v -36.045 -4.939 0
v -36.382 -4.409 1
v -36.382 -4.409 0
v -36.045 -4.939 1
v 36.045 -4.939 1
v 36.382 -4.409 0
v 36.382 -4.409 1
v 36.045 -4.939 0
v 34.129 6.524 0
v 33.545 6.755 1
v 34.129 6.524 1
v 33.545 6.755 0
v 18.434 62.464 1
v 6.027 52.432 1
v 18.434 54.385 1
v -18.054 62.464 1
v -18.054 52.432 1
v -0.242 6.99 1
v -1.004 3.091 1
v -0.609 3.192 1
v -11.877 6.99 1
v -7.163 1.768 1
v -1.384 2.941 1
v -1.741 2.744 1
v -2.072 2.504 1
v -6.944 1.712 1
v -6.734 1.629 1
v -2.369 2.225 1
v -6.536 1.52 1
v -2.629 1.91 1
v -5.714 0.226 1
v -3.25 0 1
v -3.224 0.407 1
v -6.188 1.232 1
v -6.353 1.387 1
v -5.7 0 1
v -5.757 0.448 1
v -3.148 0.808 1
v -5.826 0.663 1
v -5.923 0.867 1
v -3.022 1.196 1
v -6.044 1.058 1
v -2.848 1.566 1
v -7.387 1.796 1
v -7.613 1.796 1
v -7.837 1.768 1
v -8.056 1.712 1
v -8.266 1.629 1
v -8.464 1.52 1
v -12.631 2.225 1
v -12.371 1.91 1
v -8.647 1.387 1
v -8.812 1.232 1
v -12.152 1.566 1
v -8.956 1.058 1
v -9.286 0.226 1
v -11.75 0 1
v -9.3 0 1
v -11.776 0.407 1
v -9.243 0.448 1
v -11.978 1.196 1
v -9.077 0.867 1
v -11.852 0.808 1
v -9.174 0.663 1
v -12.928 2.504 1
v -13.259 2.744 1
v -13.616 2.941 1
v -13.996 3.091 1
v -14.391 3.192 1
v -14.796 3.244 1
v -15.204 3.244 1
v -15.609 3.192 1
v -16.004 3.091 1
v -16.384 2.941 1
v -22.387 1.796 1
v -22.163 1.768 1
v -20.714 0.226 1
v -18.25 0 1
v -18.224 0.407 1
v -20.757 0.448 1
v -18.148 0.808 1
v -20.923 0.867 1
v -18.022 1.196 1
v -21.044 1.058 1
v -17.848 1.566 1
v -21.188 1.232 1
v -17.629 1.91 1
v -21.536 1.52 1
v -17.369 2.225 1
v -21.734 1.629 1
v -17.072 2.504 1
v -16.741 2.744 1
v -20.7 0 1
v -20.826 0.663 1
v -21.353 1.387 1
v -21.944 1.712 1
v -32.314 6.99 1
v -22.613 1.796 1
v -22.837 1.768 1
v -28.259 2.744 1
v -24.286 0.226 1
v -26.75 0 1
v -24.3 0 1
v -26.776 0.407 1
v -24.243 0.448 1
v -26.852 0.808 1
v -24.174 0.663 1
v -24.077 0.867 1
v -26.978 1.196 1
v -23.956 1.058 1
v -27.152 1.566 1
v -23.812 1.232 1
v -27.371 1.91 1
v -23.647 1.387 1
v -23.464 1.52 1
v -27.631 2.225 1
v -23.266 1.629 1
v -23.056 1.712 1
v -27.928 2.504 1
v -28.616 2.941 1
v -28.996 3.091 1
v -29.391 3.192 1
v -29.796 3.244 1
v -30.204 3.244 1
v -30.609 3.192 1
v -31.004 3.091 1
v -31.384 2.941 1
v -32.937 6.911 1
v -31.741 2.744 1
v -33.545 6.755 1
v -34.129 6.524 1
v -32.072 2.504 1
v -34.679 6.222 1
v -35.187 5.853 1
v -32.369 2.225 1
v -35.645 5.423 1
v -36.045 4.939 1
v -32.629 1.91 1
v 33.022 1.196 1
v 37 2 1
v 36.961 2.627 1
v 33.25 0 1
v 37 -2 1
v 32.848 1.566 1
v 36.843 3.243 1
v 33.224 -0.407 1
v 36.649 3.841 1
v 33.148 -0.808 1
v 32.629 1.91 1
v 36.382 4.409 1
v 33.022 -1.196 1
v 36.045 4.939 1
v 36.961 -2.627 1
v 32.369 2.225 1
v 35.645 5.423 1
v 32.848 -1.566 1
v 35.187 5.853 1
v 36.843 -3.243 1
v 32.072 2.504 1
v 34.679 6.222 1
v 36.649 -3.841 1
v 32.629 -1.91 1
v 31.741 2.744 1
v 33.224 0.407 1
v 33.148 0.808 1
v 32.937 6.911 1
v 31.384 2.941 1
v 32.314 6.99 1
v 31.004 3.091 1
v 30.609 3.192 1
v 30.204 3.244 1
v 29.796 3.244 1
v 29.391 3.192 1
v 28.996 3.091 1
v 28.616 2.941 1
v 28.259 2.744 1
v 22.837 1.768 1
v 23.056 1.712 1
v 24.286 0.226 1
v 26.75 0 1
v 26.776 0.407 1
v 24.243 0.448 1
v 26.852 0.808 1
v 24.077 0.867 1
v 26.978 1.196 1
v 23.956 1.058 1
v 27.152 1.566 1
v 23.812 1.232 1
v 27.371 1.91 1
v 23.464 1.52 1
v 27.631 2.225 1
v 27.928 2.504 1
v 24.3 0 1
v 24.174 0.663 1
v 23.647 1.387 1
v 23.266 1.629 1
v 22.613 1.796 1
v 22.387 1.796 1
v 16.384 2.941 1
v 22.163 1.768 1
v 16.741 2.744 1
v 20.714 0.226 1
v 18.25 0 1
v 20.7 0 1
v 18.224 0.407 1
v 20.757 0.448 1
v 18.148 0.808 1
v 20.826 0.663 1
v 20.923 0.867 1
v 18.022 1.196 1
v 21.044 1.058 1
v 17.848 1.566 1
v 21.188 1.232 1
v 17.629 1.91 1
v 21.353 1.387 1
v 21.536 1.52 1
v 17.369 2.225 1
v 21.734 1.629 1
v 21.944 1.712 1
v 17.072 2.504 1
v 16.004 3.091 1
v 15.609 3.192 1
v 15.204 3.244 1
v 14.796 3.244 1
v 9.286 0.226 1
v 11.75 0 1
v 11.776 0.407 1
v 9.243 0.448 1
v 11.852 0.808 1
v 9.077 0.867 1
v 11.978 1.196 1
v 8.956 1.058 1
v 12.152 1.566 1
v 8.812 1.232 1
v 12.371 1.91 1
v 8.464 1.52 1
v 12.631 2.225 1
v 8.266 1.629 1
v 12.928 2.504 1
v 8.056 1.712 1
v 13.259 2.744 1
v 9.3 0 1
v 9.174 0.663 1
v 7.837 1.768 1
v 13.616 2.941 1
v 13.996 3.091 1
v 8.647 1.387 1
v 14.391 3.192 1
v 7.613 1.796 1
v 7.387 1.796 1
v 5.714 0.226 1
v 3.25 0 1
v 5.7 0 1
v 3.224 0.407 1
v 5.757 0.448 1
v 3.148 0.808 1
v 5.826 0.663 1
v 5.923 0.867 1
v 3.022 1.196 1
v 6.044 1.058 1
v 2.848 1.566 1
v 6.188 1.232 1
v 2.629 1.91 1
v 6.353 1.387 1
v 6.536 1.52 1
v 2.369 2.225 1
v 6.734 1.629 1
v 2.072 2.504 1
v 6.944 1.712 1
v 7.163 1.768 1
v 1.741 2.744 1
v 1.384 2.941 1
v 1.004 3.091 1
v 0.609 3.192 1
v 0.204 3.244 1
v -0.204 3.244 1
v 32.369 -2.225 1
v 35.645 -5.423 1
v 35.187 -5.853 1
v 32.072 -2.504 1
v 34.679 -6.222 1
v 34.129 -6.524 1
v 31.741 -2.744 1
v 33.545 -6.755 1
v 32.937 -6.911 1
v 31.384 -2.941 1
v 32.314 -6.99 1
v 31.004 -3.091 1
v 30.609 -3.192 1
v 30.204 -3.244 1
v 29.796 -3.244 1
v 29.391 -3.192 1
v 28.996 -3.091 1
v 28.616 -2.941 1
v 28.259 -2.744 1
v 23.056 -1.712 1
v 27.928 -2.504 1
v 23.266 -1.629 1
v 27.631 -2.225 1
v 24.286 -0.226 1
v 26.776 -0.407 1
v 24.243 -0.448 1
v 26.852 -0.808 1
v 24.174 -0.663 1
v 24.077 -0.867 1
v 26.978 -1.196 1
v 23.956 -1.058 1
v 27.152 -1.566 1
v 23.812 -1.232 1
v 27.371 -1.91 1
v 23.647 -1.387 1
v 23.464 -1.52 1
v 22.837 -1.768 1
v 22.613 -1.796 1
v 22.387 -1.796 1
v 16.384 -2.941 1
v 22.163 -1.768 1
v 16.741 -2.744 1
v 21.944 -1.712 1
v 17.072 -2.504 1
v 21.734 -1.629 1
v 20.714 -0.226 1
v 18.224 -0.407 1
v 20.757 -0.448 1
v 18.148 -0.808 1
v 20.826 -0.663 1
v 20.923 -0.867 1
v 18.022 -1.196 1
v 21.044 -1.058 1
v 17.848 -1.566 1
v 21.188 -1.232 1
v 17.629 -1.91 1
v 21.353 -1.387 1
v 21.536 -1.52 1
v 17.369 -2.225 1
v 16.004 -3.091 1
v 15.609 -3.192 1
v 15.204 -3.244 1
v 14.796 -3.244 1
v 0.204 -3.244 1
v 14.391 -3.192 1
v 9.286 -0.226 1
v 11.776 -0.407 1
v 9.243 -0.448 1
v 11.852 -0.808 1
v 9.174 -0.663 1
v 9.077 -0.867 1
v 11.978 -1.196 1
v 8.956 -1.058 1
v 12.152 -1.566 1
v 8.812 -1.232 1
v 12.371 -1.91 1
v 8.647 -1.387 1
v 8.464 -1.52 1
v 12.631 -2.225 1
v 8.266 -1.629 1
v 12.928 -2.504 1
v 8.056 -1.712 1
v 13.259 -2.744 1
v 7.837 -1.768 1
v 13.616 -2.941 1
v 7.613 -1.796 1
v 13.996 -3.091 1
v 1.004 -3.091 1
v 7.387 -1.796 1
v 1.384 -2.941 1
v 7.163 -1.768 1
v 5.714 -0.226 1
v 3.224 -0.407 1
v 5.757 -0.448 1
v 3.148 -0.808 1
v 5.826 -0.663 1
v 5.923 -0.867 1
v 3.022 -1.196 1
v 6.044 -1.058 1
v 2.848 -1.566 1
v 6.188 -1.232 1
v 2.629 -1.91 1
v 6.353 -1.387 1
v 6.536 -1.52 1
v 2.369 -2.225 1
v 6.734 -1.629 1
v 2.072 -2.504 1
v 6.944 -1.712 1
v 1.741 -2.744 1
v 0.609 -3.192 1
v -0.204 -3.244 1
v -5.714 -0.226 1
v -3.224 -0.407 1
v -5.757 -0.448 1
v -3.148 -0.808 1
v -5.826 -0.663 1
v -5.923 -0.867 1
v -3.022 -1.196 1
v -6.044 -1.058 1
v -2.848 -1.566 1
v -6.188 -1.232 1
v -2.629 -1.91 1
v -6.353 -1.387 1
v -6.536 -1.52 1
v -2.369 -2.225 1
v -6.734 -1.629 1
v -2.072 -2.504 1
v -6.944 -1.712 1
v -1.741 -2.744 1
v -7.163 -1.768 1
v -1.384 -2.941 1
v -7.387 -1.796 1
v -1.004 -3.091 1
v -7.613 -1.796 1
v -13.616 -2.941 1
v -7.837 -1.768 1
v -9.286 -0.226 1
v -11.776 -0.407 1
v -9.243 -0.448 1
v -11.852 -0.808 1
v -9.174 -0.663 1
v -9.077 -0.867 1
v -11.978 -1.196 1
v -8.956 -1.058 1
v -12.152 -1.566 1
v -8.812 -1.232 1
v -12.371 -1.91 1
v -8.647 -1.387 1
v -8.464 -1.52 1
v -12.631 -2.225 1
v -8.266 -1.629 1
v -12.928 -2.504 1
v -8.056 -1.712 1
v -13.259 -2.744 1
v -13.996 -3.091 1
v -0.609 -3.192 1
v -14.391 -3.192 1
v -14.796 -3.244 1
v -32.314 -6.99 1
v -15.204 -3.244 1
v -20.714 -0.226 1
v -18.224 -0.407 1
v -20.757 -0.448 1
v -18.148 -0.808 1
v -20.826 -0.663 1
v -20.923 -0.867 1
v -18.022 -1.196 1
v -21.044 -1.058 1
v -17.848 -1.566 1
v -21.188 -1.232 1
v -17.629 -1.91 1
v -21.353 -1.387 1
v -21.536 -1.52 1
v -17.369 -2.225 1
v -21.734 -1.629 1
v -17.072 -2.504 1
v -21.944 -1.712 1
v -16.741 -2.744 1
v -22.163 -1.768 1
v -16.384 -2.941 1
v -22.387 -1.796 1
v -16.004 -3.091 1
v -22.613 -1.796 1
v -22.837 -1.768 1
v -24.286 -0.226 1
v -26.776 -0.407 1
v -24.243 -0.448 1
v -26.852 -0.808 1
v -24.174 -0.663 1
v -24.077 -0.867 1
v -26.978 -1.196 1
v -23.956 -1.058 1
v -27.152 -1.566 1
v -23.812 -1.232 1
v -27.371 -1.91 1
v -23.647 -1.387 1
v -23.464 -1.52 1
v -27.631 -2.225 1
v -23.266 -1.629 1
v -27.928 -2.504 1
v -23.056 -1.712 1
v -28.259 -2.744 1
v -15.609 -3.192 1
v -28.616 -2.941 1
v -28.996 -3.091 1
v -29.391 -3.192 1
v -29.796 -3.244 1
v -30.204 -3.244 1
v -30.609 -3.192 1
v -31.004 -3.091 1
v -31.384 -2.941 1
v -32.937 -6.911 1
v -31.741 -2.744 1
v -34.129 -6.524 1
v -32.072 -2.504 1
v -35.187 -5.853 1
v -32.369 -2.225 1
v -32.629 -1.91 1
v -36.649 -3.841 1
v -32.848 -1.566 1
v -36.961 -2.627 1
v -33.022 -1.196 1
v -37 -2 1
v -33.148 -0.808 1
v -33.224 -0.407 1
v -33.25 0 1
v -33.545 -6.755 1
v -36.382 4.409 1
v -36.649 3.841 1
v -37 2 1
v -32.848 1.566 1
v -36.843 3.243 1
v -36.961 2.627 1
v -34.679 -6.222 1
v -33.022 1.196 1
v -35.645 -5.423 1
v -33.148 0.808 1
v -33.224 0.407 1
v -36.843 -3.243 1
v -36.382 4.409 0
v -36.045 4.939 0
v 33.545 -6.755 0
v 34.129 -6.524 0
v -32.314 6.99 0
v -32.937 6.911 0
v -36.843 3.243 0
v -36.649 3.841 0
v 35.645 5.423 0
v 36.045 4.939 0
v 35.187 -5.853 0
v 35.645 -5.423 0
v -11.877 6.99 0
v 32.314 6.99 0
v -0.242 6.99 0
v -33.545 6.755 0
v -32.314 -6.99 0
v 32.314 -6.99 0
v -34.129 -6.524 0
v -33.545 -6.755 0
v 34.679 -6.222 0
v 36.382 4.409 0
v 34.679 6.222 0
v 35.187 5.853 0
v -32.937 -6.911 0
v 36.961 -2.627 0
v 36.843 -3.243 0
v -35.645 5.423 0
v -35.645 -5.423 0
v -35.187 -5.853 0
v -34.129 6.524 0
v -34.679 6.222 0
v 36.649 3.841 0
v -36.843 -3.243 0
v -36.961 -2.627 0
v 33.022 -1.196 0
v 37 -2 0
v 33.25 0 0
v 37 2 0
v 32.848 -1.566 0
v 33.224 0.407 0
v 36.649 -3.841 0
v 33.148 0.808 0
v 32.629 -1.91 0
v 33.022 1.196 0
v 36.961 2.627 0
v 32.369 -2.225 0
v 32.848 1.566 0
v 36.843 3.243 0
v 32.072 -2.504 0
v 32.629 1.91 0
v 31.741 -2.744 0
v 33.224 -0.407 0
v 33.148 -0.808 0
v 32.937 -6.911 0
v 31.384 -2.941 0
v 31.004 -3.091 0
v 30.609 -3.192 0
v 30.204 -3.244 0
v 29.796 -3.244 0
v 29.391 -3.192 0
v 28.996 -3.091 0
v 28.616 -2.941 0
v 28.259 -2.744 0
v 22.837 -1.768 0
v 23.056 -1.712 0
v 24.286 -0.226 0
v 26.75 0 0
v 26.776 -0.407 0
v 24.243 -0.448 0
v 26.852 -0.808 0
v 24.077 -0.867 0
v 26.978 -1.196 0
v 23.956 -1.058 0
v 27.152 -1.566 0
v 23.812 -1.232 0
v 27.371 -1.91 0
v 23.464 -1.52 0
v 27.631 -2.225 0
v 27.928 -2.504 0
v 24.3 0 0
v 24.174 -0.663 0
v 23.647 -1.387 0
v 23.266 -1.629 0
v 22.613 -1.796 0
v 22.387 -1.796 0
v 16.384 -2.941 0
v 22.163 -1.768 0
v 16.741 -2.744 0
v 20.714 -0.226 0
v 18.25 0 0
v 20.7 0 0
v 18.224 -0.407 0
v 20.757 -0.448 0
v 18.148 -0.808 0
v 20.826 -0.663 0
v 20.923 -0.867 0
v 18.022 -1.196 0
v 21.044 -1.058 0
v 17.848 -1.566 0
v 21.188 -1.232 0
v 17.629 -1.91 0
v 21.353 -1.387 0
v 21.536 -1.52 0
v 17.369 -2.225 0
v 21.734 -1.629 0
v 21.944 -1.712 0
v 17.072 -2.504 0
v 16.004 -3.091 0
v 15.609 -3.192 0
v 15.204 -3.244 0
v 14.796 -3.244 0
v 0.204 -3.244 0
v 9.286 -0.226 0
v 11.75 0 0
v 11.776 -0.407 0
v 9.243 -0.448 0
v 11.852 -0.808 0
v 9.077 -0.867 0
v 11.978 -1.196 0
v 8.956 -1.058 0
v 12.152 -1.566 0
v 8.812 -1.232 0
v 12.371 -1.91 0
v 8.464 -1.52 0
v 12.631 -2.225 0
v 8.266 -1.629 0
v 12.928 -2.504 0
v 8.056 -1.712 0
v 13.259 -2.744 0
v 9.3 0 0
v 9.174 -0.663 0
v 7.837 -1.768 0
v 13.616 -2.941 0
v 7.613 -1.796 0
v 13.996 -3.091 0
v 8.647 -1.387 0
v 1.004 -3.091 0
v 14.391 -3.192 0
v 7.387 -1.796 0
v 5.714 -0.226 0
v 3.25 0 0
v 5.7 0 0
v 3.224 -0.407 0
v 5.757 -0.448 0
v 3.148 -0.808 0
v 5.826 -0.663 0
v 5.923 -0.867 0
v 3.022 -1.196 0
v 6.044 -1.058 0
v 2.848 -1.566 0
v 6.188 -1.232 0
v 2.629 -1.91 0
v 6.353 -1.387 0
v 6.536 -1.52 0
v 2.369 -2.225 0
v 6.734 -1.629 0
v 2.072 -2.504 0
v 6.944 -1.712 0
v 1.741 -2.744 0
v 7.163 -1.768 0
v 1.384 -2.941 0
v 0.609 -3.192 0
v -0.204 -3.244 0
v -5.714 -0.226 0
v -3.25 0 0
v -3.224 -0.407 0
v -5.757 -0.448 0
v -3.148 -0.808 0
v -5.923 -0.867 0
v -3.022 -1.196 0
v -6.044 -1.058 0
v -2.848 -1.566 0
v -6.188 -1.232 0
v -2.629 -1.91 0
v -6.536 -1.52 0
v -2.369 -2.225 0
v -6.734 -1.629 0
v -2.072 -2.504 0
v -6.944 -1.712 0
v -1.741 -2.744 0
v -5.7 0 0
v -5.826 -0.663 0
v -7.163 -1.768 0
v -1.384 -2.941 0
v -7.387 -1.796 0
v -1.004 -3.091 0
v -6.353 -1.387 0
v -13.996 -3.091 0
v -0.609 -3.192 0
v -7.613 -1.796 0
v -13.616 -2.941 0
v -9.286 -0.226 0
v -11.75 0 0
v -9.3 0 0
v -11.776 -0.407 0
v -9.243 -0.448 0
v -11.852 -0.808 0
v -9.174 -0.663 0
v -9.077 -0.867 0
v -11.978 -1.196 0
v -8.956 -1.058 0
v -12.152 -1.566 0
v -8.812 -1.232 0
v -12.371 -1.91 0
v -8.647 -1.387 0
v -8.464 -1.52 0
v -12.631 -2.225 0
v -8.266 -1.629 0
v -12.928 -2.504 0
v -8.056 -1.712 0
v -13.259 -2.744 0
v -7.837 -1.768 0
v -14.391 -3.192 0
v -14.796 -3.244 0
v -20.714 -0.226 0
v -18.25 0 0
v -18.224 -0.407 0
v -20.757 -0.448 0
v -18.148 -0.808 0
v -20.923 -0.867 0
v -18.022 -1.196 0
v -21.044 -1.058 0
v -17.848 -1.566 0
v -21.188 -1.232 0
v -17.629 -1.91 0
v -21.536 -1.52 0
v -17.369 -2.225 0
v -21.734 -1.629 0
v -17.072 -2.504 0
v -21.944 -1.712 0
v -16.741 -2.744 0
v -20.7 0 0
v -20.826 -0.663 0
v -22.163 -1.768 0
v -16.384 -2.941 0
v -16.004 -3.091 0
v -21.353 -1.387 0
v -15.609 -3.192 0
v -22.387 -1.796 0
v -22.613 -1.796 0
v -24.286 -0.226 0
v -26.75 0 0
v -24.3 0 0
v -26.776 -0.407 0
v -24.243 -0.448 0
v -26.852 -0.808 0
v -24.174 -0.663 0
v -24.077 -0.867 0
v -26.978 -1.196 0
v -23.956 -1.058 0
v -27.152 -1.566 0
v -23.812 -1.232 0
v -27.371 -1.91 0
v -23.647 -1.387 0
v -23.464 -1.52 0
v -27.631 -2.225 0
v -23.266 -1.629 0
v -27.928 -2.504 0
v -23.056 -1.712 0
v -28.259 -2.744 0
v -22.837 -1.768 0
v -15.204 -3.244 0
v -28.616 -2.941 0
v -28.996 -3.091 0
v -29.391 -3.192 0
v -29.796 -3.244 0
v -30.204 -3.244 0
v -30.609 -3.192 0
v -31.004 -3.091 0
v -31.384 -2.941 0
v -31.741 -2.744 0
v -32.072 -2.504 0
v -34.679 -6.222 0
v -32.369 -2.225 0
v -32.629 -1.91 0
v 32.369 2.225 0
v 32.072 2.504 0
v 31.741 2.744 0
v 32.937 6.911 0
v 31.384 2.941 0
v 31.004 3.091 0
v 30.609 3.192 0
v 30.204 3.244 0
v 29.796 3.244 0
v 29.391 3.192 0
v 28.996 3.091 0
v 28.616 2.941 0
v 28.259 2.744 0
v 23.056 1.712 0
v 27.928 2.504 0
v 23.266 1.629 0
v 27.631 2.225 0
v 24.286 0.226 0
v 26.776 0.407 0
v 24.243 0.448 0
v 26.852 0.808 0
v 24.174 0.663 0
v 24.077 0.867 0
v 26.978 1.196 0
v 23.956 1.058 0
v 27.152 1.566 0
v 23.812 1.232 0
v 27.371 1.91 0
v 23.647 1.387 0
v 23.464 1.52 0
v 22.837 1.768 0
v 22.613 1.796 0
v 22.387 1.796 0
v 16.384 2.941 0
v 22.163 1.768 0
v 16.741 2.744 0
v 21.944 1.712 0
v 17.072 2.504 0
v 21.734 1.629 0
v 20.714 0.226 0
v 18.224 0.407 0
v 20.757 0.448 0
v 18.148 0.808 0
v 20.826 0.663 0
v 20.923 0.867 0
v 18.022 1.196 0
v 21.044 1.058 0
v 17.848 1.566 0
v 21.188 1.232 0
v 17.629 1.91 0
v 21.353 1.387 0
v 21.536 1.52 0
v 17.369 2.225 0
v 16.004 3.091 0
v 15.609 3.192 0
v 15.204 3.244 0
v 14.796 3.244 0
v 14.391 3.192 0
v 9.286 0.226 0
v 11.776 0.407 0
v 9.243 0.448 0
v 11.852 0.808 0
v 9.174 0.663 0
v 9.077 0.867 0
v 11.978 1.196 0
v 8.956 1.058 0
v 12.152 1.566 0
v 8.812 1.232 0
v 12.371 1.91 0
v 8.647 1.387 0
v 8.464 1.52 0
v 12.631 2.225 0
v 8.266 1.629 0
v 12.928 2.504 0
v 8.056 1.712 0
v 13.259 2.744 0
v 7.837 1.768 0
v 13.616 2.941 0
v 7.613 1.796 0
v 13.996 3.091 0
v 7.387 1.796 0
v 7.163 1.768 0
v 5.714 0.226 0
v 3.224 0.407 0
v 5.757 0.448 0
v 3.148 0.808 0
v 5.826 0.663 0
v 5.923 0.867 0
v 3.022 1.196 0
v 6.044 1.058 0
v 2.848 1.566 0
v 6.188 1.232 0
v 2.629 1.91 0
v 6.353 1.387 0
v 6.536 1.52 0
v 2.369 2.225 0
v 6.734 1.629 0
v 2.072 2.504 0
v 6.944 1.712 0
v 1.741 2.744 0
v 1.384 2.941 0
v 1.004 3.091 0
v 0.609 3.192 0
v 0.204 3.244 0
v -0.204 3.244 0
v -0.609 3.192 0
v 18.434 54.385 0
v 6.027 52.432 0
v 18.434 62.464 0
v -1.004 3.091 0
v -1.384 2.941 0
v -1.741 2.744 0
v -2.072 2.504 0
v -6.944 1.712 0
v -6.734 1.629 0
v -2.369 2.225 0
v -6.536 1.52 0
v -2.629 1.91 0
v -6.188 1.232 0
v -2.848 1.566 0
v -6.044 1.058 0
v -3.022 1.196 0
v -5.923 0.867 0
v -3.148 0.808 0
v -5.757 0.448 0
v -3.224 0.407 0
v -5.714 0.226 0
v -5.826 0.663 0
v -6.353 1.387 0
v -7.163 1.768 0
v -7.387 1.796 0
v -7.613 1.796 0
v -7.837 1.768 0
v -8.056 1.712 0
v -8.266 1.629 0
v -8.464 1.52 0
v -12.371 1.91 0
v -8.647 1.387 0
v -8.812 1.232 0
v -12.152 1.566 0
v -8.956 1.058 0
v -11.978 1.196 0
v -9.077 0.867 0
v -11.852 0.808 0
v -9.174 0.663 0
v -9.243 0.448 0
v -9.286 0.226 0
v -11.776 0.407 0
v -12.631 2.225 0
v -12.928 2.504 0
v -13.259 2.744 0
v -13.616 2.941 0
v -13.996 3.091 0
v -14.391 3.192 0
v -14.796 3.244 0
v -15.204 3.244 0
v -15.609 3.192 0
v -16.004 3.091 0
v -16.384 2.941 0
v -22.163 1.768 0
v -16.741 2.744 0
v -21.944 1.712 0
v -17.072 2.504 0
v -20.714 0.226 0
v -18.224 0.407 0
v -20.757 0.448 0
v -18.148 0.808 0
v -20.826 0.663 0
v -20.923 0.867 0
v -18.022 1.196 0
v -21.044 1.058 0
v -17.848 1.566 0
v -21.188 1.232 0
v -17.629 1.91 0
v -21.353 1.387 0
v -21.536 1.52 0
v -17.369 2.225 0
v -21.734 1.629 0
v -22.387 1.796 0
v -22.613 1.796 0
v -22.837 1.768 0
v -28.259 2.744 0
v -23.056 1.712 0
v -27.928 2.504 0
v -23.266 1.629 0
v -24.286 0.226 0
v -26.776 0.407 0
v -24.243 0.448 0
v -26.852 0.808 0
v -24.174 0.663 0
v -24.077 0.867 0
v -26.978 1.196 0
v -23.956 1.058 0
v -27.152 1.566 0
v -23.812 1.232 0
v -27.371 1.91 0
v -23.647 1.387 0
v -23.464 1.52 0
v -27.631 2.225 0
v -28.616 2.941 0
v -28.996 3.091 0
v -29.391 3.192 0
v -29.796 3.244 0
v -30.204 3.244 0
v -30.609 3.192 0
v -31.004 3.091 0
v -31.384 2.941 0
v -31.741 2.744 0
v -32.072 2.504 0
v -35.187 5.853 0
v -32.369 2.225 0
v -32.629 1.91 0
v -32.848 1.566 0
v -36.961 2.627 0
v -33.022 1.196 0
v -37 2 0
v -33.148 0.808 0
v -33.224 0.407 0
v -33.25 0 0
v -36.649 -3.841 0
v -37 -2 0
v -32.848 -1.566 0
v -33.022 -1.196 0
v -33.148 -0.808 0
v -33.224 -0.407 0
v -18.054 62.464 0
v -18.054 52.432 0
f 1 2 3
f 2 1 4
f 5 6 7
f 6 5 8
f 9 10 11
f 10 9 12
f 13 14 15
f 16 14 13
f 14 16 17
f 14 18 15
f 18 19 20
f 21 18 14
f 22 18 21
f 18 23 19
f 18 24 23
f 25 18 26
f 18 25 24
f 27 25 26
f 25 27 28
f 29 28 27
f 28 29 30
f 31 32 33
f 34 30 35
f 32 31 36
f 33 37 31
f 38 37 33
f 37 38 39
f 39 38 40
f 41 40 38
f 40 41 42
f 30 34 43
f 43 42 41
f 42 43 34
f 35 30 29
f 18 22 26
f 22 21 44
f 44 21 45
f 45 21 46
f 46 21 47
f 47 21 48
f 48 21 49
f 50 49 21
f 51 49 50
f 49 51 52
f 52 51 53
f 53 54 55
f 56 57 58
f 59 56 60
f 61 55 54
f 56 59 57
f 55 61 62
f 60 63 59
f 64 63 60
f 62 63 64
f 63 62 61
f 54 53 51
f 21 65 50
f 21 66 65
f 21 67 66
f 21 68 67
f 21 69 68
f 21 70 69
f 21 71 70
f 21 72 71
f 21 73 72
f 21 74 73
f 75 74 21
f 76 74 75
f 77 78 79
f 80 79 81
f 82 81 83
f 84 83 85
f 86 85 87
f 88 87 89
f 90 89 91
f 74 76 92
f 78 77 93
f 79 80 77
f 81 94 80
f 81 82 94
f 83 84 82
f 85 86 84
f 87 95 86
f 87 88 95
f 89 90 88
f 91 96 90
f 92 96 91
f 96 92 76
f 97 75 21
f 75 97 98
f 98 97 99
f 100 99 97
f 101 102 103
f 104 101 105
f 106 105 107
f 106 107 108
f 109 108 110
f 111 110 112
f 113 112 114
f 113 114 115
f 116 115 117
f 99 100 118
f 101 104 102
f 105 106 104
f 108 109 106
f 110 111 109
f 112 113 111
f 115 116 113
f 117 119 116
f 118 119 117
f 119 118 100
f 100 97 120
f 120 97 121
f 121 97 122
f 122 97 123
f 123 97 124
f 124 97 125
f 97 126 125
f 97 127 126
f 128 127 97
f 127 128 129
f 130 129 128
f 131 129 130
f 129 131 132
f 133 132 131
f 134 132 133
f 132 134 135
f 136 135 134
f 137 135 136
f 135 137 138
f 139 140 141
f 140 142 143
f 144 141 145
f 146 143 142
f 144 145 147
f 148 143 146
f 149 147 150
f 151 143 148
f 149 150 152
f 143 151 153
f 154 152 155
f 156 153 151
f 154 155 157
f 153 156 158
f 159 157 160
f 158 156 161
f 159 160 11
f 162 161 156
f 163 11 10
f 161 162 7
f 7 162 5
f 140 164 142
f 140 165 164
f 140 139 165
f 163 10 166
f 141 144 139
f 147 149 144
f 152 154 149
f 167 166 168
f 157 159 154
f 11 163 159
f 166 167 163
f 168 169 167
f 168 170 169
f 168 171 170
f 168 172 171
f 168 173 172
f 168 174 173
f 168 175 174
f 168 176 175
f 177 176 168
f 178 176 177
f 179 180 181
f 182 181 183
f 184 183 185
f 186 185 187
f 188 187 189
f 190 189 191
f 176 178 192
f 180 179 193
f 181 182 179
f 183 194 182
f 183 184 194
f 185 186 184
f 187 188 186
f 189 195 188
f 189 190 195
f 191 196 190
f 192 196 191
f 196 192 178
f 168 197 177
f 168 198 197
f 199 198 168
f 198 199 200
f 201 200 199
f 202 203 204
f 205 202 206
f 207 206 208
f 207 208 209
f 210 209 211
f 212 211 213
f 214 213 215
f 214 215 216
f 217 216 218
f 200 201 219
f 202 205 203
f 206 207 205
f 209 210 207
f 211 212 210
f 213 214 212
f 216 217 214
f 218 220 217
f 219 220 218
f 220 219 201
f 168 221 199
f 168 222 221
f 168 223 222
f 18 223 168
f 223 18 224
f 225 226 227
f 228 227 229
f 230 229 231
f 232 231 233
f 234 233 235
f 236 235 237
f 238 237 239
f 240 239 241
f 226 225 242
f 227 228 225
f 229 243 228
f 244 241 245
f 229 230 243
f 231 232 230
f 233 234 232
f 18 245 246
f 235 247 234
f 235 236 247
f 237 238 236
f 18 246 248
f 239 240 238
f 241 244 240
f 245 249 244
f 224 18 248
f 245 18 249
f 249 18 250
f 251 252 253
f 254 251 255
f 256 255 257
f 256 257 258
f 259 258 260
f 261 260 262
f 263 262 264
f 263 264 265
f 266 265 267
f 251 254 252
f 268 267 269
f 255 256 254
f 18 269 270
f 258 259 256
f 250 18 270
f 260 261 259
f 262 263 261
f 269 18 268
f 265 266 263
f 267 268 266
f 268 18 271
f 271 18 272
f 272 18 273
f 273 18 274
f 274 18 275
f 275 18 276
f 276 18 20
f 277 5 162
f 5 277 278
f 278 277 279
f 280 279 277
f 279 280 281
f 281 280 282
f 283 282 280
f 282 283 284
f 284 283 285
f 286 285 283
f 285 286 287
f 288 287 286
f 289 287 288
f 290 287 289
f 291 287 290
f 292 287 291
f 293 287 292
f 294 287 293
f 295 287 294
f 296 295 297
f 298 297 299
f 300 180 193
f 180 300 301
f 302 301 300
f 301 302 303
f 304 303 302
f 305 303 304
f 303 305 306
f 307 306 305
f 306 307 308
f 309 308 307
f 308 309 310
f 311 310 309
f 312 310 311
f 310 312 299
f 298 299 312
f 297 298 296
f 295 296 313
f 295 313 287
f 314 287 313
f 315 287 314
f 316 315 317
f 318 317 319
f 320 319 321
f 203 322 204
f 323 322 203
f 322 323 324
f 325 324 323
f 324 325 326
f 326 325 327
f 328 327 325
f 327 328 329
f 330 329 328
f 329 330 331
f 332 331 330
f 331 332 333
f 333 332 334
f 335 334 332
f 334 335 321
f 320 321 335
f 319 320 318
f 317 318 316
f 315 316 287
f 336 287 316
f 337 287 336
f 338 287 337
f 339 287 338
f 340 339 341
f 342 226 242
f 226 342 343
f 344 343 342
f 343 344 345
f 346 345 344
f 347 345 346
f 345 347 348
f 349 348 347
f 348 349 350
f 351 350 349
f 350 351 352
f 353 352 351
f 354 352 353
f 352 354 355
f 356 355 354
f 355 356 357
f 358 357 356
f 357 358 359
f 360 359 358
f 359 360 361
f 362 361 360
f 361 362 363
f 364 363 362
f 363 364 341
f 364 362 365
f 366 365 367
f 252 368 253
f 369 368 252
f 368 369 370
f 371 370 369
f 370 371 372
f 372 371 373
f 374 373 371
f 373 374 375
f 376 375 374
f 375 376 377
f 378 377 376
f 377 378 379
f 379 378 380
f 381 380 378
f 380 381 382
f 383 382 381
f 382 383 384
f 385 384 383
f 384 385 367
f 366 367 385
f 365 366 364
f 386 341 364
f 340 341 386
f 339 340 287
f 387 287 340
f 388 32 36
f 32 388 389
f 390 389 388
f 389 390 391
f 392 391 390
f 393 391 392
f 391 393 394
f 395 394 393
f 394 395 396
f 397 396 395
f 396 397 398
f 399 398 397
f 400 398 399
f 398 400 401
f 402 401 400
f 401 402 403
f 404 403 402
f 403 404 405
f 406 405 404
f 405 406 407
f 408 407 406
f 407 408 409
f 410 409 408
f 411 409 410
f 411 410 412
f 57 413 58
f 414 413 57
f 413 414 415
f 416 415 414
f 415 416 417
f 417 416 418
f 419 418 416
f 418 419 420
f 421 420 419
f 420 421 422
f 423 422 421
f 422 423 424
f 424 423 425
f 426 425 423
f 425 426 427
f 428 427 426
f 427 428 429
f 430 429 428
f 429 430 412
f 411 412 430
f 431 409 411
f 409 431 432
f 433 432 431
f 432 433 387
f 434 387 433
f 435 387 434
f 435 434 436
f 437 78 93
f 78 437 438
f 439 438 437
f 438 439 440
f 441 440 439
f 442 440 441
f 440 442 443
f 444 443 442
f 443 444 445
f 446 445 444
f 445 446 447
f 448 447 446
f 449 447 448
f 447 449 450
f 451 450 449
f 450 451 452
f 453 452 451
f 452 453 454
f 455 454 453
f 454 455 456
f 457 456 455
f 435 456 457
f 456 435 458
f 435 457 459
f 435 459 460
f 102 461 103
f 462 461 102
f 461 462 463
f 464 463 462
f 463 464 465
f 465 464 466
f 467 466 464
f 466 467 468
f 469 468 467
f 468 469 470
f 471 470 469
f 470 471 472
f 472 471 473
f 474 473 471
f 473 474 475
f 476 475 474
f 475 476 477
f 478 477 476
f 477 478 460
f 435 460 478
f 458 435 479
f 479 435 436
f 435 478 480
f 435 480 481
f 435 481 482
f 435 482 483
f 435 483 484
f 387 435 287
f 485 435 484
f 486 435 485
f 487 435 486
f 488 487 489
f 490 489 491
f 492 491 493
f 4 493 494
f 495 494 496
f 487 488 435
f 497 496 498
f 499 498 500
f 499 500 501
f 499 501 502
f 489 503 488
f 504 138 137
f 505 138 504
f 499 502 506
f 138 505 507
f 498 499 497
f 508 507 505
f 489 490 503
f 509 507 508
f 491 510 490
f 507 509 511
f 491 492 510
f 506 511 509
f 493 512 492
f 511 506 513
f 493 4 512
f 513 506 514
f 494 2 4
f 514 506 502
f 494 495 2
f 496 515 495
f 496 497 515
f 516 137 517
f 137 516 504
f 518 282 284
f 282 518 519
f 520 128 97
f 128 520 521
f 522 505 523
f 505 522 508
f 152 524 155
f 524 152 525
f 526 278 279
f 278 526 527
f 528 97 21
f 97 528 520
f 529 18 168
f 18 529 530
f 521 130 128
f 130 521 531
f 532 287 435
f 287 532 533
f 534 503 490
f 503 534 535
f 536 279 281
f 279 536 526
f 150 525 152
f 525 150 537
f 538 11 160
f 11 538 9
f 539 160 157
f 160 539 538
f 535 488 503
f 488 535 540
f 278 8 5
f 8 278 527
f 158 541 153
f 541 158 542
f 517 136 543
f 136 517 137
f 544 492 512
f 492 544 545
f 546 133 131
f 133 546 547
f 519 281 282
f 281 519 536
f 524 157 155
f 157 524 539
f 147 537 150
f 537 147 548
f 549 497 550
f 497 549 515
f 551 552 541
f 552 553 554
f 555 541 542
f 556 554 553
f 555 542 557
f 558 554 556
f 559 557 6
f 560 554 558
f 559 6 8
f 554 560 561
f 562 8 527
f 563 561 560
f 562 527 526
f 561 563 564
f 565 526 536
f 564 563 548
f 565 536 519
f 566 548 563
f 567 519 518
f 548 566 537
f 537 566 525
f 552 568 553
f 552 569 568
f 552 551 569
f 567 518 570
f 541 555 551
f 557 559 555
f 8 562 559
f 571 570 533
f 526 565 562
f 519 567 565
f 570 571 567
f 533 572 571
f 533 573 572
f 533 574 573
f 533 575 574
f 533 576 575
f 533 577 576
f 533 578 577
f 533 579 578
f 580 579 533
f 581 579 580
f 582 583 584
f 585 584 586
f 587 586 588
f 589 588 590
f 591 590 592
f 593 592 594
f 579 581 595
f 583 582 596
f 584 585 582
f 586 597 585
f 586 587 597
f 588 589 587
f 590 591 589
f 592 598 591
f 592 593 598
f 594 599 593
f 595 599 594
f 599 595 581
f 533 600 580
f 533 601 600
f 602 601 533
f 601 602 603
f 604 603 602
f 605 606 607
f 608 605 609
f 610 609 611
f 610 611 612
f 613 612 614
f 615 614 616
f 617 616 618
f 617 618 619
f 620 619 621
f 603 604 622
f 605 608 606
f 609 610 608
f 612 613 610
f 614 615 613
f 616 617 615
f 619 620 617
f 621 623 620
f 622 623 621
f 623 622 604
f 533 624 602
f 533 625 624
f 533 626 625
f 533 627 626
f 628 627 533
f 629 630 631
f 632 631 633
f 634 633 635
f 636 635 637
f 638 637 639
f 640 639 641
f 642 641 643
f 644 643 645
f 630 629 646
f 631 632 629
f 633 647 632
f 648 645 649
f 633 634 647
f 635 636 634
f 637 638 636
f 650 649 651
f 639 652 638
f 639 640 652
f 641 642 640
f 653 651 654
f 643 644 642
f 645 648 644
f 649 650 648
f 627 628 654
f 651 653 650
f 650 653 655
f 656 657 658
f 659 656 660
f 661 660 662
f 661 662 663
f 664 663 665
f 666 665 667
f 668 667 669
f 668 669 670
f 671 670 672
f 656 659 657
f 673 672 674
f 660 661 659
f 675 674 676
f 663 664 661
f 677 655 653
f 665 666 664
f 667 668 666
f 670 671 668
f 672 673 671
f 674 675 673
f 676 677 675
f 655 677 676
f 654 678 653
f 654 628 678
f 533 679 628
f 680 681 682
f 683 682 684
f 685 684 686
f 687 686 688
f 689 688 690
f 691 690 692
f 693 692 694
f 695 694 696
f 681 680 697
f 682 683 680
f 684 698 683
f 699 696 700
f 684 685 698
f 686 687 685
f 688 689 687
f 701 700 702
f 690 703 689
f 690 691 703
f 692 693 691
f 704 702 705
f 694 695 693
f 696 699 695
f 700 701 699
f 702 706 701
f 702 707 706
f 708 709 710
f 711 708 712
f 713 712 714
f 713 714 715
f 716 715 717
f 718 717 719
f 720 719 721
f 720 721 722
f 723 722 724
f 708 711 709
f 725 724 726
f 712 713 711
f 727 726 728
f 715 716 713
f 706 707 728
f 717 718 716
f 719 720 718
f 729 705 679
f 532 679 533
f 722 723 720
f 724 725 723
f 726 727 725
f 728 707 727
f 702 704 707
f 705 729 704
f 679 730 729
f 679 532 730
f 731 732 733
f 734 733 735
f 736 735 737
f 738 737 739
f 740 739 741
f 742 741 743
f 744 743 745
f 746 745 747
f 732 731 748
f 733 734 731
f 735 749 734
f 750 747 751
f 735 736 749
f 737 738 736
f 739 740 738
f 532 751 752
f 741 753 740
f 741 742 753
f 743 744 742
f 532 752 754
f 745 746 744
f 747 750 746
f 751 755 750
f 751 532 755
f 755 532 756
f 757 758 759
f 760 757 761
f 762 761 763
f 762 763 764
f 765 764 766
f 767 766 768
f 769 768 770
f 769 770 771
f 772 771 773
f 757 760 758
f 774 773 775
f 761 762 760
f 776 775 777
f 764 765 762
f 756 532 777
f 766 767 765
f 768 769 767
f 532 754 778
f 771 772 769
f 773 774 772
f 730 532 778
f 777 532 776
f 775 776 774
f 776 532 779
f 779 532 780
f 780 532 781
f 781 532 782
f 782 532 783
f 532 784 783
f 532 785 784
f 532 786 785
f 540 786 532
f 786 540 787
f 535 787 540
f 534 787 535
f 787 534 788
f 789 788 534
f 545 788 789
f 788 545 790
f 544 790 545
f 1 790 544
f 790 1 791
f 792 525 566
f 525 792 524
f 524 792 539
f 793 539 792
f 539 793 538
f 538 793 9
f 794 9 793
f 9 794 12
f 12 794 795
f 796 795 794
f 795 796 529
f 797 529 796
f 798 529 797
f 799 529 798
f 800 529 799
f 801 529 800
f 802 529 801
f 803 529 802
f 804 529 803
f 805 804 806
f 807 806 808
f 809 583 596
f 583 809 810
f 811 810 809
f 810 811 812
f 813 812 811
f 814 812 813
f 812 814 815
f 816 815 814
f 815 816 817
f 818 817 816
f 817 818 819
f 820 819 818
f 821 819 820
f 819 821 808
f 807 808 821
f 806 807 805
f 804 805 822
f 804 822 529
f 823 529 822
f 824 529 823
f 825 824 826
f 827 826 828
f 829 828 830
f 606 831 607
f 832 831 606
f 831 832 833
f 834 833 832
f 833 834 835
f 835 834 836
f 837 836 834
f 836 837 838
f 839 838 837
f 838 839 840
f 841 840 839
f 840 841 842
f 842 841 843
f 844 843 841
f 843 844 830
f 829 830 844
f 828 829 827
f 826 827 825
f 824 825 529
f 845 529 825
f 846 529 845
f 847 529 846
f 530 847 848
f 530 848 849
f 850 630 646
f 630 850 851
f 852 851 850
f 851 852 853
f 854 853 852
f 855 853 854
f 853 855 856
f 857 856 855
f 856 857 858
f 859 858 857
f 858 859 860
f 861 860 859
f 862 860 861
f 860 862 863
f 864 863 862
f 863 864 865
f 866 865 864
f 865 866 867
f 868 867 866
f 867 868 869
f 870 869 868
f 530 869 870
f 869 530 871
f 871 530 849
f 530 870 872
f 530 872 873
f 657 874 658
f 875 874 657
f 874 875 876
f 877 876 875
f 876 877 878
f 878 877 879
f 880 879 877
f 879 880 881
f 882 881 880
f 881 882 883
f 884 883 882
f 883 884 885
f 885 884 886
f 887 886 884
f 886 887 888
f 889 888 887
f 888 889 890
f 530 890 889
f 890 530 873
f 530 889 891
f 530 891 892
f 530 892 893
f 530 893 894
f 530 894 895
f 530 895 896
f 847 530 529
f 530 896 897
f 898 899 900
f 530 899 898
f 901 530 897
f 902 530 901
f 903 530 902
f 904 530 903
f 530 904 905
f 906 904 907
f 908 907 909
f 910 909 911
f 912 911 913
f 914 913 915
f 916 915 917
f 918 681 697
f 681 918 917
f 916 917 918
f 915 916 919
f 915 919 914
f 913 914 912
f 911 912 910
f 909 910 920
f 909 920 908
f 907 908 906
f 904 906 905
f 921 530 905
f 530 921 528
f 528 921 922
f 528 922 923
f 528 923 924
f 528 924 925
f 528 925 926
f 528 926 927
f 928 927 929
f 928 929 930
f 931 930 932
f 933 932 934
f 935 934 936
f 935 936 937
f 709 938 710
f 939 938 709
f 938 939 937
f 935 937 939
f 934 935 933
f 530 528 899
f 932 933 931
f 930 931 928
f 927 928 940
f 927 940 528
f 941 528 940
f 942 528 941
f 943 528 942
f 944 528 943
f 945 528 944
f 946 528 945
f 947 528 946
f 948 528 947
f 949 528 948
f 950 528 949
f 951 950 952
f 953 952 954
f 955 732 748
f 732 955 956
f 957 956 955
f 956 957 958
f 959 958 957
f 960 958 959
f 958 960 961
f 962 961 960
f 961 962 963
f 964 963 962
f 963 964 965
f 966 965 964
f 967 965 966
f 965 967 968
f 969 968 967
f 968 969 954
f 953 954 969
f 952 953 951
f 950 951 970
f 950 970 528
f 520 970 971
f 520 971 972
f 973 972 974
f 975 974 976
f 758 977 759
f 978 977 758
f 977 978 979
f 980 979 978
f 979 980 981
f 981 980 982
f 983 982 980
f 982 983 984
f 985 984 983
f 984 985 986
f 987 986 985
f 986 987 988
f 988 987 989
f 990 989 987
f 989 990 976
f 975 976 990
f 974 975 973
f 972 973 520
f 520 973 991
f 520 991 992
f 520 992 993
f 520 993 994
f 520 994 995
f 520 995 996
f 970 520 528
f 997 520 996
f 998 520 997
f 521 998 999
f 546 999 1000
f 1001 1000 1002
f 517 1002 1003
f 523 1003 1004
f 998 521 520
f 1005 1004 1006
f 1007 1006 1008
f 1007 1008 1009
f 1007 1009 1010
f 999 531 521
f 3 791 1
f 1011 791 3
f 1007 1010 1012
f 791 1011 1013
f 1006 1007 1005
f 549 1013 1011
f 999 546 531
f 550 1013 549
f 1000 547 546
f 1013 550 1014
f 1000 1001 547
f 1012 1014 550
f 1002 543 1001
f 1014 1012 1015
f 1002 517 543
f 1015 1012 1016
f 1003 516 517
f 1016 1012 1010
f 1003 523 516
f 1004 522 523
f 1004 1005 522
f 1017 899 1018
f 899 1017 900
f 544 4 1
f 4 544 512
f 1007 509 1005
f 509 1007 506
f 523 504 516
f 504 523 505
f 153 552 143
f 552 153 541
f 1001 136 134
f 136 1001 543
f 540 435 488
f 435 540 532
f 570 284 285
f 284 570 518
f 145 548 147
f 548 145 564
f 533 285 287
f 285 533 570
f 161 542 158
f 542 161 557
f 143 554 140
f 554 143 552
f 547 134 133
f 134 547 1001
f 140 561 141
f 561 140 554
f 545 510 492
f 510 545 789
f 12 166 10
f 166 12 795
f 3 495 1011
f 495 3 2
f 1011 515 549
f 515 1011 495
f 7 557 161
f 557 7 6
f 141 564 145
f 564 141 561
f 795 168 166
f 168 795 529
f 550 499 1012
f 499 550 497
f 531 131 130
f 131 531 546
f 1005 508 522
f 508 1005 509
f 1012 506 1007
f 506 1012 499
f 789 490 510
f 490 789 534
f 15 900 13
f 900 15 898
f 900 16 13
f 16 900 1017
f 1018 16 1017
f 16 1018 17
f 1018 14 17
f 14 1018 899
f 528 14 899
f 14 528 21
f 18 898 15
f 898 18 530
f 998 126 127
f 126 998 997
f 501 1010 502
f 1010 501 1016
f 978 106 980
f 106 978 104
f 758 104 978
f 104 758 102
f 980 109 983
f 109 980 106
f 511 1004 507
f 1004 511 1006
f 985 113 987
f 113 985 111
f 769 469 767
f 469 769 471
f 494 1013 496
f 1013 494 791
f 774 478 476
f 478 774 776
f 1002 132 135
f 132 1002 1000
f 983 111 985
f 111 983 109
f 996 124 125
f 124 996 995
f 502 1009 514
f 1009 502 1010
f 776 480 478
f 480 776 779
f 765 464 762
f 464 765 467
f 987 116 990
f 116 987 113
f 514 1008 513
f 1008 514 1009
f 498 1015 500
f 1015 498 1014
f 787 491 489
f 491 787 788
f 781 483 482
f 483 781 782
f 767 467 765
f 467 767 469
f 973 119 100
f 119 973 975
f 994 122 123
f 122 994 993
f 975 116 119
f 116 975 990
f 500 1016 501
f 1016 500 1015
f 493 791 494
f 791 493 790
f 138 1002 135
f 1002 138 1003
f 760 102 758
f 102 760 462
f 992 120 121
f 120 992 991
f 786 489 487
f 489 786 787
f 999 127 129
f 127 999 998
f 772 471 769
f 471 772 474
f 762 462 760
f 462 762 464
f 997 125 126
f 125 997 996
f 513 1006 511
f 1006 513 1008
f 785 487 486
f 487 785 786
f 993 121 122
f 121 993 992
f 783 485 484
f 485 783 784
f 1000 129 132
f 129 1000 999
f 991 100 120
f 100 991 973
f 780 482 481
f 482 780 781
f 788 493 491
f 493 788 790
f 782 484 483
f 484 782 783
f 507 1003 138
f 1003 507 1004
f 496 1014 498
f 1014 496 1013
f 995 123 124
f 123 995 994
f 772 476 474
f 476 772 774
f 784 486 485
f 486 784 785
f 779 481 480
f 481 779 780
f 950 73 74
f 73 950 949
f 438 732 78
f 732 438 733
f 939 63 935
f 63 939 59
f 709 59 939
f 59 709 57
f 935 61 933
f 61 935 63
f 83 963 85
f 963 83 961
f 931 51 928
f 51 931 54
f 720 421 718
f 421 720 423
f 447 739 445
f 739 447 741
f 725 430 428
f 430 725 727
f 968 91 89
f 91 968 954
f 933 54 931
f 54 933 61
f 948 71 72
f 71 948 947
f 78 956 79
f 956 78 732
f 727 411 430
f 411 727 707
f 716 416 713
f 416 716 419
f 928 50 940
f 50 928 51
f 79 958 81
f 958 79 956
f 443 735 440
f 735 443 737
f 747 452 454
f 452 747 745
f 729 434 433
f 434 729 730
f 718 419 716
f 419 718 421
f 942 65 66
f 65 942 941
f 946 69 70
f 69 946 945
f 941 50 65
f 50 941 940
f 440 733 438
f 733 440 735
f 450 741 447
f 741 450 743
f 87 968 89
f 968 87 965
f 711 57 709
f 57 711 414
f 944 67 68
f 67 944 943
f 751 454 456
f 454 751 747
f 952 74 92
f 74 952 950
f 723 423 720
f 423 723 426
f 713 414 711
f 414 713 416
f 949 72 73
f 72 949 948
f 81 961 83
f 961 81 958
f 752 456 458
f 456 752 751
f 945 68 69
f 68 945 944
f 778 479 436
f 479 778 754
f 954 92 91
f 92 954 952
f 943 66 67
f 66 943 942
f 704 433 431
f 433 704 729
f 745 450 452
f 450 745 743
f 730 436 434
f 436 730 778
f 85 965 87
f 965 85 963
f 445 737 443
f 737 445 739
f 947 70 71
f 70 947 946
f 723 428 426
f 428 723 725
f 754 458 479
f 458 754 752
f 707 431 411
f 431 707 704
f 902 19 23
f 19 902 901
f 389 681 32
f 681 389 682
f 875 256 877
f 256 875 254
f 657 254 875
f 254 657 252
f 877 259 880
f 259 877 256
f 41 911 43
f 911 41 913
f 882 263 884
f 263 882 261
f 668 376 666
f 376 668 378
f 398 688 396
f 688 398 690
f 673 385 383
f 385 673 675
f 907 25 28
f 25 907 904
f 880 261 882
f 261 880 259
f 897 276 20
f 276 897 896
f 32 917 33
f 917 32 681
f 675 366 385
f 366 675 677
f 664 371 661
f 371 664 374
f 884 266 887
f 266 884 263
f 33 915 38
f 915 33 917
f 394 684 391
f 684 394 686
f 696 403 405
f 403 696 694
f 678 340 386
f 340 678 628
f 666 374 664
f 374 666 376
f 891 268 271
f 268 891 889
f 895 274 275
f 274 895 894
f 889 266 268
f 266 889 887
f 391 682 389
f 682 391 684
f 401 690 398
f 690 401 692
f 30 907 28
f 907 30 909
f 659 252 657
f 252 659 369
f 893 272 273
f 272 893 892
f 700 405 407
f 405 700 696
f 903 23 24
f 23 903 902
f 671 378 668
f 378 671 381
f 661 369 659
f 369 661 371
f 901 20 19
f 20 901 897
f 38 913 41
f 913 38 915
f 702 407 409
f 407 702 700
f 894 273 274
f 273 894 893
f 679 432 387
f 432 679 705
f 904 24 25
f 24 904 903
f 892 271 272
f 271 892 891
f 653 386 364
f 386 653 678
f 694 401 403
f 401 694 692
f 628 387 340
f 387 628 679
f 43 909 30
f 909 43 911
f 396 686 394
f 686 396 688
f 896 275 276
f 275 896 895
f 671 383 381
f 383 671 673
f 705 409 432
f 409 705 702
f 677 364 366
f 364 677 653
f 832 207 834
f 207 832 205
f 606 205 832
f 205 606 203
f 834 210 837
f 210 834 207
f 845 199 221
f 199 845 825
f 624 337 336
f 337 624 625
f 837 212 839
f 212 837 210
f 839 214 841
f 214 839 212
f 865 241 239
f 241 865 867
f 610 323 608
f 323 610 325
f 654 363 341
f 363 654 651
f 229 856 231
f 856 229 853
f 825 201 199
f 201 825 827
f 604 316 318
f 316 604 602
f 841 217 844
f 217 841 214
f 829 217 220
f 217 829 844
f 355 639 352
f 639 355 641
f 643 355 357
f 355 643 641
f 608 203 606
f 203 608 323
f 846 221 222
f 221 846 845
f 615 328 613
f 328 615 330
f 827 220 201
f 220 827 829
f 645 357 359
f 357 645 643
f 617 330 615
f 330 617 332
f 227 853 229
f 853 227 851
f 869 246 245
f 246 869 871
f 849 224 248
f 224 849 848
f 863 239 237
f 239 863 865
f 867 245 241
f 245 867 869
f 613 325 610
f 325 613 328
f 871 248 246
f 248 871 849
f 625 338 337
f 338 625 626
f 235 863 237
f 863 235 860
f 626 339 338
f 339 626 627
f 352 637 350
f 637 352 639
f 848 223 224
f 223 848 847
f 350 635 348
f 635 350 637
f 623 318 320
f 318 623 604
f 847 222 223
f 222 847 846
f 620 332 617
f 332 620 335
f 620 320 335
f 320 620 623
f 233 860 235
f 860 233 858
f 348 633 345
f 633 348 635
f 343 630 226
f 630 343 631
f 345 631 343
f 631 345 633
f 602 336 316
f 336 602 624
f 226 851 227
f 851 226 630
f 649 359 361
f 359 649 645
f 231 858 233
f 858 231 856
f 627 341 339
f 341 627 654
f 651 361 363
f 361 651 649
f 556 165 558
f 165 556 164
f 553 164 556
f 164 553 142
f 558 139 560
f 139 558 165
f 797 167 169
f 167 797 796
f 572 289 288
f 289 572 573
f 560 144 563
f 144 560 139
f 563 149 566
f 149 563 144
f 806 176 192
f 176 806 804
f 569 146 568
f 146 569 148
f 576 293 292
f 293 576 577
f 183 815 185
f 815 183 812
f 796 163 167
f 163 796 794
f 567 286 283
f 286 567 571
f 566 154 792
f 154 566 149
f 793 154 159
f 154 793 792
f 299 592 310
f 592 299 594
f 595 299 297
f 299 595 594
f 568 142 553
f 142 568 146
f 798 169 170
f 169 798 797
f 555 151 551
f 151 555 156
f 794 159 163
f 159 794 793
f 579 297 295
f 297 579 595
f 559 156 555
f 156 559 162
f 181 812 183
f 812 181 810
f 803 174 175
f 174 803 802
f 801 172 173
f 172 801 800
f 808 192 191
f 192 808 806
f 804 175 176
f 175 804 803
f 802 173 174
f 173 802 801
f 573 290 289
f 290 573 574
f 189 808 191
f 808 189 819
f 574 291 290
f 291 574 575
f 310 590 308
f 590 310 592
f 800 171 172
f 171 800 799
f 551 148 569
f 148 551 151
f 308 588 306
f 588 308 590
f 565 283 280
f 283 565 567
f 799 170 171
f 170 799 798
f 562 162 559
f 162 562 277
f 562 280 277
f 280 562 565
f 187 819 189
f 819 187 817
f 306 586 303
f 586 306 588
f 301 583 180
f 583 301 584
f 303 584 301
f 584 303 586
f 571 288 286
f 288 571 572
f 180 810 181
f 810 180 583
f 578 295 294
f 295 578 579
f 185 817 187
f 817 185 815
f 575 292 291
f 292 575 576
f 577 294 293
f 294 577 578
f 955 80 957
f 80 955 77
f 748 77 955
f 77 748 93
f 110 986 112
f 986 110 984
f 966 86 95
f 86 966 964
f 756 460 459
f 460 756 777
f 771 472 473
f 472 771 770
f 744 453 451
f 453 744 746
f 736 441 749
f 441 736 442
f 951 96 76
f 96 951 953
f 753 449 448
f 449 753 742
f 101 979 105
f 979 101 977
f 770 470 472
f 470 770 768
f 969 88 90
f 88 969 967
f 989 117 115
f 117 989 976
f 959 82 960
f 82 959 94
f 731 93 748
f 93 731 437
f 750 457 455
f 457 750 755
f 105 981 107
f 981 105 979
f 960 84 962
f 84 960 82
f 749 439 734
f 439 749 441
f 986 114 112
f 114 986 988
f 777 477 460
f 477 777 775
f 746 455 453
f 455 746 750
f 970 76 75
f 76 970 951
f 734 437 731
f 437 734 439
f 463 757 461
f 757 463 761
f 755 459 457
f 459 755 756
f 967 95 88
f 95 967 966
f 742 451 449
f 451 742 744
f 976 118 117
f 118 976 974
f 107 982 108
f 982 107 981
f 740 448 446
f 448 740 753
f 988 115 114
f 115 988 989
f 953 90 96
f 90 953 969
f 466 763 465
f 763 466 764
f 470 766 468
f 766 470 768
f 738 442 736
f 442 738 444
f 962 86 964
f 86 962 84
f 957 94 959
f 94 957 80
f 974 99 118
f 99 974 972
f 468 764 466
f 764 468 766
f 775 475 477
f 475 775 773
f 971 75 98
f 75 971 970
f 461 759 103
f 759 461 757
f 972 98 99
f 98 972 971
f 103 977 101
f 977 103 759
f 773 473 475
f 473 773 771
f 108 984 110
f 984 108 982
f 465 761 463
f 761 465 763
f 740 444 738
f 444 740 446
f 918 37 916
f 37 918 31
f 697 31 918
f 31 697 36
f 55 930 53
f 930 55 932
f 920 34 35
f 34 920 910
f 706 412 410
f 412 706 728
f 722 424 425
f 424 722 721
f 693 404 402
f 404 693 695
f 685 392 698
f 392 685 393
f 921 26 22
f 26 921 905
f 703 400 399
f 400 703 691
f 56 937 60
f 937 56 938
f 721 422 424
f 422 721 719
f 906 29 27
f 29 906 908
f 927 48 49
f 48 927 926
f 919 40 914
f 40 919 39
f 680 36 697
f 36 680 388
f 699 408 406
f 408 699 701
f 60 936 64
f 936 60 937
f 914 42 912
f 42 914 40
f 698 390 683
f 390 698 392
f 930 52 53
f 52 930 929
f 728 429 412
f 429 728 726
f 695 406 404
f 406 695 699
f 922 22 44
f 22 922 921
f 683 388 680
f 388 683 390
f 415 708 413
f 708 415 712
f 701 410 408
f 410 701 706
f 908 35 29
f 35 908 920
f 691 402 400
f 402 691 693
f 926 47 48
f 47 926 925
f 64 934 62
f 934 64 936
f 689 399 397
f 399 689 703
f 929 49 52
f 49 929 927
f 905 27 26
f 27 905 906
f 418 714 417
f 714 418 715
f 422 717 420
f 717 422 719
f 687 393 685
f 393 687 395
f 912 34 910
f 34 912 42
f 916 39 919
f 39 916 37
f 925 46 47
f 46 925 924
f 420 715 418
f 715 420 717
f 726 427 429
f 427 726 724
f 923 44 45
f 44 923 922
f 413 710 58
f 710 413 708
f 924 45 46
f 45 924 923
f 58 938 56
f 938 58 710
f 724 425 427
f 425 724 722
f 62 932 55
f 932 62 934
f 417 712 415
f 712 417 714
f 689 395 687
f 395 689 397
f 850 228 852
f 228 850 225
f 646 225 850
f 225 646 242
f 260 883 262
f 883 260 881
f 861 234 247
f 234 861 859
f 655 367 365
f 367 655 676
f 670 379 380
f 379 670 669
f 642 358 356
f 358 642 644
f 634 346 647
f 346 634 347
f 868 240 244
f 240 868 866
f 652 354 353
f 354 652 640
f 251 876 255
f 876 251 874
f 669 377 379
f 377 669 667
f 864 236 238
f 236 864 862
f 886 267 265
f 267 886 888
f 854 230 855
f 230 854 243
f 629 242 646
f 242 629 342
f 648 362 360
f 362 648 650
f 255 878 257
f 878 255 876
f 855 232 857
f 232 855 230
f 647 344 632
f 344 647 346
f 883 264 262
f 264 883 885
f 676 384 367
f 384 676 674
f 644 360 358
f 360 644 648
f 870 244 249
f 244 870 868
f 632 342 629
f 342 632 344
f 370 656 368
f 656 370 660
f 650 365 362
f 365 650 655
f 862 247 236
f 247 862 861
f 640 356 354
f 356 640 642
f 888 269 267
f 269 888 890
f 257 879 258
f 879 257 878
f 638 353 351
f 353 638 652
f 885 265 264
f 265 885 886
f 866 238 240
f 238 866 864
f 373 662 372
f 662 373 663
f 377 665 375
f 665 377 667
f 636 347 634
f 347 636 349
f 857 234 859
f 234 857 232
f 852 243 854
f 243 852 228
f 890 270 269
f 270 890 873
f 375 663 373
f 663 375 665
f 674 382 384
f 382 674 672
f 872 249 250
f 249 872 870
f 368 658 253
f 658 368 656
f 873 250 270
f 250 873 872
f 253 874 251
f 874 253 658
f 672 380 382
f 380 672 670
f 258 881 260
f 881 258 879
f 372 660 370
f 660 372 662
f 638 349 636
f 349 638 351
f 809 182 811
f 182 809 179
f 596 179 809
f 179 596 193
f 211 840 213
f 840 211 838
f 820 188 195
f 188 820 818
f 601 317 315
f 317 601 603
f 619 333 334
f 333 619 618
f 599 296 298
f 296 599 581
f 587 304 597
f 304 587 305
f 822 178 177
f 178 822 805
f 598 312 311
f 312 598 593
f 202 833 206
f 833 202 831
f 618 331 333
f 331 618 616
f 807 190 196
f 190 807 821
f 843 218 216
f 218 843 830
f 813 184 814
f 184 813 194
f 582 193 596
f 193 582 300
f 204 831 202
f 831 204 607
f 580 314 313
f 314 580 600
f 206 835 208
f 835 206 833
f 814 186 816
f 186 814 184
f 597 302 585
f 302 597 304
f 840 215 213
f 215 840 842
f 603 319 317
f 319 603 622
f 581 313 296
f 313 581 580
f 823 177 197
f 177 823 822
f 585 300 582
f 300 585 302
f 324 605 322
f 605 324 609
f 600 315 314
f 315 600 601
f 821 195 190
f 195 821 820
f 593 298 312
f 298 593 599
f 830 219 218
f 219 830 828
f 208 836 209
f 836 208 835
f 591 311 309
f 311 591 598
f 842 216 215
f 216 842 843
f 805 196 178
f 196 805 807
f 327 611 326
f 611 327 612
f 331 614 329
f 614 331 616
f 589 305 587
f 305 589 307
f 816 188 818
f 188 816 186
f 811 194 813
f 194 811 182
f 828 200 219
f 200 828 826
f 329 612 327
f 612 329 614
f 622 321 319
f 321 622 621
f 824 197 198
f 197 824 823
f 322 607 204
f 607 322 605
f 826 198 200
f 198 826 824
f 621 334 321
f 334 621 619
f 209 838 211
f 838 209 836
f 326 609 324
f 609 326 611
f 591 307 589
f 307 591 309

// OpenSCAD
$fn = 50;


difference() {
	union() {
		hull() {
			translate(v = [-32.0000000000, 2.0000000000, 0]) {
				cylinder(h = 1, r = 5);
			}
			translate(v = [32.0000000000, 2.0000000000, 0]) {
				cylinder(h = 1, r = 5);
			}
			translate(v = [-32.0000000000, -2.0000000000, 0]) {
				cylinder(h = 1, r = 5);
			}
			translate(v = [32.0000000000, -2.0000000000, 0]) {
				cylinder(h = 1, r = 5);
			}
		}
		translate(v = [0, 61.1111111111, 0]) {
			linear_extrude(height = 1) {
				text(font = "DejaVu Sans Mono:style=Bold", halign = "center", size = 57.0000000000, text = "7", valign = "top");
			}
		}
	}
	union() {
		translate(v = [-30.0000000000, 0.0000000000, 0]) {
			translate(v = [0, 0, -100]) {
				cylinder(h = 200, r = 3.2500000000);
			}
		}
		translate(v = [-15.0000000000, 0.0000000000, 0]) {
			translate(v = [0, 0, -100]) {
				cylinder(h = 200, r = 3.2500000000);
			}
		}
		translate(v = [0, 0, -100]) {
			cylinder(h = 200, r = 3.2500000000);
		}
		translate(v = [15.0000000000, 0.0000000000, 0]) {
			translate(v = [0, 0, -100]) {
				cylinder(h = 200, r = 3.2500000000);
			}
		}
		translate(v = [30.0000000000, 0.0000000000, 0]) {
			translate(v = [0, 0, -100]) {
				cylinder(h = 200, r = 3.2500000000);
			}
		}
		translate(v = [-30.0000000000, 0.0000000000, 0]) {
			translate(v = [0, 0, -100]) {
				cylinder(h = 200, r = 1.8000000000);
			}
		}
		translate(v = [-22.5000000000, 0.0000000000, 0]) {
			translate(v = [0, 0, -100]) {
				cylinder(h = 200, r = 1.8000000000);
			}
		}
		translate(v = [-15.0000000000, 0.0000000000, 0]) {
			translate(v = [0, 0, -100]) {
				cylinder(h = 200, r = 1.8000000000);
			}
		}
		translate(v = [-7.5000000000, 0.0000000000, 0]) {
			translate(v = [0, 0, -100]) {
				cylinder(h = 200, r = 1.8000000000);
			}
		}
		translate(v = [0, 0, -100]) {
			cylinder(h = 200, r = 1.8000000000);
		}
		translate(v = [7.5000000000, 0.0000000000, 0]) {
			translate(v = [0, 0, -100]) {
				cylinder(h = 200, r = 1.8000000000);
			}
		}
		translate(v = [15.0000000000, 0.0000000000, 0]) {
			translate(v = [0, 0, -100]) {
				cylinder(h = 200, r = 1.8000000000);
			}
		}
		translate(v = [22.5000000000, 0.0000000000, 0]) {
			translate(v = [0, 0, -100]) {
				cylinder(h = 200, r = 1.8000000000);
			}
		}
		translate(v = [30.0000000000, 0.0000000000, 0]) {
			translate(v = [0, 0, -100]) {
				cylinder(h = 200, r = 1.8000000000);
			}
		}
	}
}
